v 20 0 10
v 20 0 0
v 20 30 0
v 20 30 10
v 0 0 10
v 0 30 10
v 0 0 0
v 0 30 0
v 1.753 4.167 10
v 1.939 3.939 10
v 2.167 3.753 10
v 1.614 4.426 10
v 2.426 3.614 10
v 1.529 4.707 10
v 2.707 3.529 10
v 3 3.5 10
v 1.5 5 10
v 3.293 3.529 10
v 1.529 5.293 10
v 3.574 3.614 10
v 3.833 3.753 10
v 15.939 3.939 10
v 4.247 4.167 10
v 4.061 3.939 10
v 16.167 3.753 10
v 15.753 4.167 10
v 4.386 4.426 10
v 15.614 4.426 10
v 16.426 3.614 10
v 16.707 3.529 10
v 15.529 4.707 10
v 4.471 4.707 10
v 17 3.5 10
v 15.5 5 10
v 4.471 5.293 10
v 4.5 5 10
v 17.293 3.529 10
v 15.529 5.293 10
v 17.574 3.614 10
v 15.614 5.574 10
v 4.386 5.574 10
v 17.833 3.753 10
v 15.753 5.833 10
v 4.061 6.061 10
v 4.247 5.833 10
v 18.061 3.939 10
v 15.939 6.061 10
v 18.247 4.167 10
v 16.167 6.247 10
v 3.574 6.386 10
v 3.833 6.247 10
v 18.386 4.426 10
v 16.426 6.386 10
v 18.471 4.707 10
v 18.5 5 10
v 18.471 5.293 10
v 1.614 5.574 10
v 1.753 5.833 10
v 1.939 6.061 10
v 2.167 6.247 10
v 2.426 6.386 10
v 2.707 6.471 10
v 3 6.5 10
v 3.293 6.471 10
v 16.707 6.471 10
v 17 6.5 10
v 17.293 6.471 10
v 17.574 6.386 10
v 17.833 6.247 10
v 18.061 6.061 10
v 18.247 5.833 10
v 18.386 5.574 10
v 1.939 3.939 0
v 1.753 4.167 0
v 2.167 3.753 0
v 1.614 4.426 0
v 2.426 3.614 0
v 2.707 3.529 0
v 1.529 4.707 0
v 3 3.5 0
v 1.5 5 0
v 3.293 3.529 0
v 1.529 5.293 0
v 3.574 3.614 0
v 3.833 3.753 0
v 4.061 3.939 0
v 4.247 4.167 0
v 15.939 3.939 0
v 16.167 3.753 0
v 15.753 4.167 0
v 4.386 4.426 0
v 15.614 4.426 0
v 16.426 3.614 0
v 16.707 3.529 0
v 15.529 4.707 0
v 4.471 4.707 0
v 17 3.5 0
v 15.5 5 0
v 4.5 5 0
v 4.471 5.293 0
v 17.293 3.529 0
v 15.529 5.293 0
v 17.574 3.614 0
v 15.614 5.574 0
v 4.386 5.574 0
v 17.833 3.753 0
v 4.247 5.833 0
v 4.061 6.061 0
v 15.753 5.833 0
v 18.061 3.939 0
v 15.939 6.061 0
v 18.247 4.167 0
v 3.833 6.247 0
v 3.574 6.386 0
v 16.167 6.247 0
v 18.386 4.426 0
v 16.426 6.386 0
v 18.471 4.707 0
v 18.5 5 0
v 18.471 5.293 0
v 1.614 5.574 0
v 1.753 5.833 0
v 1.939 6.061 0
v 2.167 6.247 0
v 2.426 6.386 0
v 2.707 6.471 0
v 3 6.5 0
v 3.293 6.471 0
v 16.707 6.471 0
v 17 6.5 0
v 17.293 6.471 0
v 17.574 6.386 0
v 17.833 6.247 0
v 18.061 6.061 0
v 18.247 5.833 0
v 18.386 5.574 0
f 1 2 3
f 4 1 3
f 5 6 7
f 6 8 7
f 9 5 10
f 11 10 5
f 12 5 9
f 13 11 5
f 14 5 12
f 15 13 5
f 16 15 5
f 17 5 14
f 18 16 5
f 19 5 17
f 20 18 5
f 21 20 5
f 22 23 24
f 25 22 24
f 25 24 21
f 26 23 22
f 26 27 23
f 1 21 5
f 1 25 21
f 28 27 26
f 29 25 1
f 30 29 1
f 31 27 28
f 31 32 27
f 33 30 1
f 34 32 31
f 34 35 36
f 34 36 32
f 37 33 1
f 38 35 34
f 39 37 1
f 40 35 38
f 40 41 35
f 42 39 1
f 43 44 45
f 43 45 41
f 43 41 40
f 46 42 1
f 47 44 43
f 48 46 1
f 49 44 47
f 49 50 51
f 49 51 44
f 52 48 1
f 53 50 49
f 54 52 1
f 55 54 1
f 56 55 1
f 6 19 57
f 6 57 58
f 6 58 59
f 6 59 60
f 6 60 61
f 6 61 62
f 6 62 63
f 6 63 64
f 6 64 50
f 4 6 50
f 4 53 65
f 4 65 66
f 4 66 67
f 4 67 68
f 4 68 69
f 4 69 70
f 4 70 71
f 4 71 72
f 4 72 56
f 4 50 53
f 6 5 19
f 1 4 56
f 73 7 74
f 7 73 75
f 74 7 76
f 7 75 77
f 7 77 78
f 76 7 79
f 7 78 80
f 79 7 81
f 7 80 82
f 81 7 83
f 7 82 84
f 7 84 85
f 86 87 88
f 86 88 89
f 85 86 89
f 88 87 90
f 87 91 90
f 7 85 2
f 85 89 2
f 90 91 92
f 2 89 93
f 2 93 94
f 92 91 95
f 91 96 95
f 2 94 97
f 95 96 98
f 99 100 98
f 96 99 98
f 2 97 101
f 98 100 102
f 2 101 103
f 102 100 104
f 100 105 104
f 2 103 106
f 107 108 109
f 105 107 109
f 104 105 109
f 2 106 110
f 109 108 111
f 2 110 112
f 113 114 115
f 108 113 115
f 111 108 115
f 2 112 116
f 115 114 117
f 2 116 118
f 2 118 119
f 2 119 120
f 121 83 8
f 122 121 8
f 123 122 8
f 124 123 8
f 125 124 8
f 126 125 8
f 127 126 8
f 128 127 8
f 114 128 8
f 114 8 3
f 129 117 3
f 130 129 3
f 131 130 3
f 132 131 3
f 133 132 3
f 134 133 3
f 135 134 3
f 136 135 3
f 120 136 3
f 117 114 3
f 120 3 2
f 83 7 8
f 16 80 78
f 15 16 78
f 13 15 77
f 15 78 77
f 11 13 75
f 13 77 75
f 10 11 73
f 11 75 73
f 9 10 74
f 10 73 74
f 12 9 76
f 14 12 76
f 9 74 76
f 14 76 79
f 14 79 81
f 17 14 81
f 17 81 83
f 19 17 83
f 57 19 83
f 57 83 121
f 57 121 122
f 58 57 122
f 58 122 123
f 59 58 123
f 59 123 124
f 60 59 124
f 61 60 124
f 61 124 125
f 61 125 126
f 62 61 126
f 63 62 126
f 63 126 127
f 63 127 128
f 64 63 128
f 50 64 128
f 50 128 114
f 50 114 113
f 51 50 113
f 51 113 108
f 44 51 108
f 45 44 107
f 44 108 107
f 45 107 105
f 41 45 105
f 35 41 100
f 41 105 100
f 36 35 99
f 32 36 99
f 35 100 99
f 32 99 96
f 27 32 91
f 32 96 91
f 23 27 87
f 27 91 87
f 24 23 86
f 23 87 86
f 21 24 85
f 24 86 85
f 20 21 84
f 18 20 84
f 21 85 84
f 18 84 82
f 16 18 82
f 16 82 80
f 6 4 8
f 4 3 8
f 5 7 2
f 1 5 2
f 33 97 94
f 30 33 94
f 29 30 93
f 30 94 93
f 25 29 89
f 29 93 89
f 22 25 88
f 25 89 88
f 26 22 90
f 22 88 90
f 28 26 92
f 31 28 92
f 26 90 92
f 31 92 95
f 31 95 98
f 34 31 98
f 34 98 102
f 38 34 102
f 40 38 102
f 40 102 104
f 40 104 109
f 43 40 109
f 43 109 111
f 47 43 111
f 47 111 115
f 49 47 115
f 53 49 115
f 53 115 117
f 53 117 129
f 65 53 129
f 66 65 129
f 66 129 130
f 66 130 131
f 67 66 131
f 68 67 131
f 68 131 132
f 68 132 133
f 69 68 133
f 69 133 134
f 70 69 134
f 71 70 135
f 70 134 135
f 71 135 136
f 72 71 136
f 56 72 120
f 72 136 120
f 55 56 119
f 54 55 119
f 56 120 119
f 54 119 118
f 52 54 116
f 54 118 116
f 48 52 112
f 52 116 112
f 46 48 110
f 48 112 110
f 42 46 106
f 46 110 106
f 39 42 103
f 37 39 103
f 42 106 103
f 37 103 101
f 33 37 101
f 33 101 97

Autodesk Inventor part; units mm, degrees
ref_plane "YZ Plane" through (0, 0, 0) normal (1, 0, 0) x (0, 1, 0)
ref_plane "XZ Plane" through (0, 0, 0) normal (0, 1, 0) x (-1, 0, 0)
ref_plane "XY Plane" through (0, 0, 0) normal (0, 0, 1) x (1, 0, 0)
sketch "スケッチ1" plane through (0, 0, 0) normal (0, 0, 1) x (1, 0, 0)
  line L0 (0, 0) -> (20, 0)
  line L1 (20, 0) -> (20, 30)
  line L2 (20, 30) -> (0, 30)
  line L3 (0, 30) -> (0, 0)
  dimension "d0" = 20
  dimension "d1" = 30
extrude "押し出し1" add sketch "スケッチ1" along normal blind 10
sketch "スケッチ2" plane through (0, 0, 10) normal (0, 0, 1) x (1, 0, 0)
  line L0 (0, 0) -> (20, 0) projected
  line L1 (10, 0) -> (10, 6.3032)
  point P0 (3, 5)
  point P1 (17, 5)
  dimension "d4" = 5
  dimension "d5" = 7
hole "穴1" at (3, 5, 10) at (17, 5, 10) direction (0, 0, -1) diameter 3 end through all
sketch "スケッチ3" plane through (0, 0, 10) normal (0, 0, 1) x (1, 0, 0)
  line L0 (20, 30) -> (0, 30) projected
  line L1 (0, 30) -> (20, 10)
  line L2 (20, 0) -> (20, 30) projected
  point P0 (0, 0)
  dimension "d13" = 10
properties part number "指上"
